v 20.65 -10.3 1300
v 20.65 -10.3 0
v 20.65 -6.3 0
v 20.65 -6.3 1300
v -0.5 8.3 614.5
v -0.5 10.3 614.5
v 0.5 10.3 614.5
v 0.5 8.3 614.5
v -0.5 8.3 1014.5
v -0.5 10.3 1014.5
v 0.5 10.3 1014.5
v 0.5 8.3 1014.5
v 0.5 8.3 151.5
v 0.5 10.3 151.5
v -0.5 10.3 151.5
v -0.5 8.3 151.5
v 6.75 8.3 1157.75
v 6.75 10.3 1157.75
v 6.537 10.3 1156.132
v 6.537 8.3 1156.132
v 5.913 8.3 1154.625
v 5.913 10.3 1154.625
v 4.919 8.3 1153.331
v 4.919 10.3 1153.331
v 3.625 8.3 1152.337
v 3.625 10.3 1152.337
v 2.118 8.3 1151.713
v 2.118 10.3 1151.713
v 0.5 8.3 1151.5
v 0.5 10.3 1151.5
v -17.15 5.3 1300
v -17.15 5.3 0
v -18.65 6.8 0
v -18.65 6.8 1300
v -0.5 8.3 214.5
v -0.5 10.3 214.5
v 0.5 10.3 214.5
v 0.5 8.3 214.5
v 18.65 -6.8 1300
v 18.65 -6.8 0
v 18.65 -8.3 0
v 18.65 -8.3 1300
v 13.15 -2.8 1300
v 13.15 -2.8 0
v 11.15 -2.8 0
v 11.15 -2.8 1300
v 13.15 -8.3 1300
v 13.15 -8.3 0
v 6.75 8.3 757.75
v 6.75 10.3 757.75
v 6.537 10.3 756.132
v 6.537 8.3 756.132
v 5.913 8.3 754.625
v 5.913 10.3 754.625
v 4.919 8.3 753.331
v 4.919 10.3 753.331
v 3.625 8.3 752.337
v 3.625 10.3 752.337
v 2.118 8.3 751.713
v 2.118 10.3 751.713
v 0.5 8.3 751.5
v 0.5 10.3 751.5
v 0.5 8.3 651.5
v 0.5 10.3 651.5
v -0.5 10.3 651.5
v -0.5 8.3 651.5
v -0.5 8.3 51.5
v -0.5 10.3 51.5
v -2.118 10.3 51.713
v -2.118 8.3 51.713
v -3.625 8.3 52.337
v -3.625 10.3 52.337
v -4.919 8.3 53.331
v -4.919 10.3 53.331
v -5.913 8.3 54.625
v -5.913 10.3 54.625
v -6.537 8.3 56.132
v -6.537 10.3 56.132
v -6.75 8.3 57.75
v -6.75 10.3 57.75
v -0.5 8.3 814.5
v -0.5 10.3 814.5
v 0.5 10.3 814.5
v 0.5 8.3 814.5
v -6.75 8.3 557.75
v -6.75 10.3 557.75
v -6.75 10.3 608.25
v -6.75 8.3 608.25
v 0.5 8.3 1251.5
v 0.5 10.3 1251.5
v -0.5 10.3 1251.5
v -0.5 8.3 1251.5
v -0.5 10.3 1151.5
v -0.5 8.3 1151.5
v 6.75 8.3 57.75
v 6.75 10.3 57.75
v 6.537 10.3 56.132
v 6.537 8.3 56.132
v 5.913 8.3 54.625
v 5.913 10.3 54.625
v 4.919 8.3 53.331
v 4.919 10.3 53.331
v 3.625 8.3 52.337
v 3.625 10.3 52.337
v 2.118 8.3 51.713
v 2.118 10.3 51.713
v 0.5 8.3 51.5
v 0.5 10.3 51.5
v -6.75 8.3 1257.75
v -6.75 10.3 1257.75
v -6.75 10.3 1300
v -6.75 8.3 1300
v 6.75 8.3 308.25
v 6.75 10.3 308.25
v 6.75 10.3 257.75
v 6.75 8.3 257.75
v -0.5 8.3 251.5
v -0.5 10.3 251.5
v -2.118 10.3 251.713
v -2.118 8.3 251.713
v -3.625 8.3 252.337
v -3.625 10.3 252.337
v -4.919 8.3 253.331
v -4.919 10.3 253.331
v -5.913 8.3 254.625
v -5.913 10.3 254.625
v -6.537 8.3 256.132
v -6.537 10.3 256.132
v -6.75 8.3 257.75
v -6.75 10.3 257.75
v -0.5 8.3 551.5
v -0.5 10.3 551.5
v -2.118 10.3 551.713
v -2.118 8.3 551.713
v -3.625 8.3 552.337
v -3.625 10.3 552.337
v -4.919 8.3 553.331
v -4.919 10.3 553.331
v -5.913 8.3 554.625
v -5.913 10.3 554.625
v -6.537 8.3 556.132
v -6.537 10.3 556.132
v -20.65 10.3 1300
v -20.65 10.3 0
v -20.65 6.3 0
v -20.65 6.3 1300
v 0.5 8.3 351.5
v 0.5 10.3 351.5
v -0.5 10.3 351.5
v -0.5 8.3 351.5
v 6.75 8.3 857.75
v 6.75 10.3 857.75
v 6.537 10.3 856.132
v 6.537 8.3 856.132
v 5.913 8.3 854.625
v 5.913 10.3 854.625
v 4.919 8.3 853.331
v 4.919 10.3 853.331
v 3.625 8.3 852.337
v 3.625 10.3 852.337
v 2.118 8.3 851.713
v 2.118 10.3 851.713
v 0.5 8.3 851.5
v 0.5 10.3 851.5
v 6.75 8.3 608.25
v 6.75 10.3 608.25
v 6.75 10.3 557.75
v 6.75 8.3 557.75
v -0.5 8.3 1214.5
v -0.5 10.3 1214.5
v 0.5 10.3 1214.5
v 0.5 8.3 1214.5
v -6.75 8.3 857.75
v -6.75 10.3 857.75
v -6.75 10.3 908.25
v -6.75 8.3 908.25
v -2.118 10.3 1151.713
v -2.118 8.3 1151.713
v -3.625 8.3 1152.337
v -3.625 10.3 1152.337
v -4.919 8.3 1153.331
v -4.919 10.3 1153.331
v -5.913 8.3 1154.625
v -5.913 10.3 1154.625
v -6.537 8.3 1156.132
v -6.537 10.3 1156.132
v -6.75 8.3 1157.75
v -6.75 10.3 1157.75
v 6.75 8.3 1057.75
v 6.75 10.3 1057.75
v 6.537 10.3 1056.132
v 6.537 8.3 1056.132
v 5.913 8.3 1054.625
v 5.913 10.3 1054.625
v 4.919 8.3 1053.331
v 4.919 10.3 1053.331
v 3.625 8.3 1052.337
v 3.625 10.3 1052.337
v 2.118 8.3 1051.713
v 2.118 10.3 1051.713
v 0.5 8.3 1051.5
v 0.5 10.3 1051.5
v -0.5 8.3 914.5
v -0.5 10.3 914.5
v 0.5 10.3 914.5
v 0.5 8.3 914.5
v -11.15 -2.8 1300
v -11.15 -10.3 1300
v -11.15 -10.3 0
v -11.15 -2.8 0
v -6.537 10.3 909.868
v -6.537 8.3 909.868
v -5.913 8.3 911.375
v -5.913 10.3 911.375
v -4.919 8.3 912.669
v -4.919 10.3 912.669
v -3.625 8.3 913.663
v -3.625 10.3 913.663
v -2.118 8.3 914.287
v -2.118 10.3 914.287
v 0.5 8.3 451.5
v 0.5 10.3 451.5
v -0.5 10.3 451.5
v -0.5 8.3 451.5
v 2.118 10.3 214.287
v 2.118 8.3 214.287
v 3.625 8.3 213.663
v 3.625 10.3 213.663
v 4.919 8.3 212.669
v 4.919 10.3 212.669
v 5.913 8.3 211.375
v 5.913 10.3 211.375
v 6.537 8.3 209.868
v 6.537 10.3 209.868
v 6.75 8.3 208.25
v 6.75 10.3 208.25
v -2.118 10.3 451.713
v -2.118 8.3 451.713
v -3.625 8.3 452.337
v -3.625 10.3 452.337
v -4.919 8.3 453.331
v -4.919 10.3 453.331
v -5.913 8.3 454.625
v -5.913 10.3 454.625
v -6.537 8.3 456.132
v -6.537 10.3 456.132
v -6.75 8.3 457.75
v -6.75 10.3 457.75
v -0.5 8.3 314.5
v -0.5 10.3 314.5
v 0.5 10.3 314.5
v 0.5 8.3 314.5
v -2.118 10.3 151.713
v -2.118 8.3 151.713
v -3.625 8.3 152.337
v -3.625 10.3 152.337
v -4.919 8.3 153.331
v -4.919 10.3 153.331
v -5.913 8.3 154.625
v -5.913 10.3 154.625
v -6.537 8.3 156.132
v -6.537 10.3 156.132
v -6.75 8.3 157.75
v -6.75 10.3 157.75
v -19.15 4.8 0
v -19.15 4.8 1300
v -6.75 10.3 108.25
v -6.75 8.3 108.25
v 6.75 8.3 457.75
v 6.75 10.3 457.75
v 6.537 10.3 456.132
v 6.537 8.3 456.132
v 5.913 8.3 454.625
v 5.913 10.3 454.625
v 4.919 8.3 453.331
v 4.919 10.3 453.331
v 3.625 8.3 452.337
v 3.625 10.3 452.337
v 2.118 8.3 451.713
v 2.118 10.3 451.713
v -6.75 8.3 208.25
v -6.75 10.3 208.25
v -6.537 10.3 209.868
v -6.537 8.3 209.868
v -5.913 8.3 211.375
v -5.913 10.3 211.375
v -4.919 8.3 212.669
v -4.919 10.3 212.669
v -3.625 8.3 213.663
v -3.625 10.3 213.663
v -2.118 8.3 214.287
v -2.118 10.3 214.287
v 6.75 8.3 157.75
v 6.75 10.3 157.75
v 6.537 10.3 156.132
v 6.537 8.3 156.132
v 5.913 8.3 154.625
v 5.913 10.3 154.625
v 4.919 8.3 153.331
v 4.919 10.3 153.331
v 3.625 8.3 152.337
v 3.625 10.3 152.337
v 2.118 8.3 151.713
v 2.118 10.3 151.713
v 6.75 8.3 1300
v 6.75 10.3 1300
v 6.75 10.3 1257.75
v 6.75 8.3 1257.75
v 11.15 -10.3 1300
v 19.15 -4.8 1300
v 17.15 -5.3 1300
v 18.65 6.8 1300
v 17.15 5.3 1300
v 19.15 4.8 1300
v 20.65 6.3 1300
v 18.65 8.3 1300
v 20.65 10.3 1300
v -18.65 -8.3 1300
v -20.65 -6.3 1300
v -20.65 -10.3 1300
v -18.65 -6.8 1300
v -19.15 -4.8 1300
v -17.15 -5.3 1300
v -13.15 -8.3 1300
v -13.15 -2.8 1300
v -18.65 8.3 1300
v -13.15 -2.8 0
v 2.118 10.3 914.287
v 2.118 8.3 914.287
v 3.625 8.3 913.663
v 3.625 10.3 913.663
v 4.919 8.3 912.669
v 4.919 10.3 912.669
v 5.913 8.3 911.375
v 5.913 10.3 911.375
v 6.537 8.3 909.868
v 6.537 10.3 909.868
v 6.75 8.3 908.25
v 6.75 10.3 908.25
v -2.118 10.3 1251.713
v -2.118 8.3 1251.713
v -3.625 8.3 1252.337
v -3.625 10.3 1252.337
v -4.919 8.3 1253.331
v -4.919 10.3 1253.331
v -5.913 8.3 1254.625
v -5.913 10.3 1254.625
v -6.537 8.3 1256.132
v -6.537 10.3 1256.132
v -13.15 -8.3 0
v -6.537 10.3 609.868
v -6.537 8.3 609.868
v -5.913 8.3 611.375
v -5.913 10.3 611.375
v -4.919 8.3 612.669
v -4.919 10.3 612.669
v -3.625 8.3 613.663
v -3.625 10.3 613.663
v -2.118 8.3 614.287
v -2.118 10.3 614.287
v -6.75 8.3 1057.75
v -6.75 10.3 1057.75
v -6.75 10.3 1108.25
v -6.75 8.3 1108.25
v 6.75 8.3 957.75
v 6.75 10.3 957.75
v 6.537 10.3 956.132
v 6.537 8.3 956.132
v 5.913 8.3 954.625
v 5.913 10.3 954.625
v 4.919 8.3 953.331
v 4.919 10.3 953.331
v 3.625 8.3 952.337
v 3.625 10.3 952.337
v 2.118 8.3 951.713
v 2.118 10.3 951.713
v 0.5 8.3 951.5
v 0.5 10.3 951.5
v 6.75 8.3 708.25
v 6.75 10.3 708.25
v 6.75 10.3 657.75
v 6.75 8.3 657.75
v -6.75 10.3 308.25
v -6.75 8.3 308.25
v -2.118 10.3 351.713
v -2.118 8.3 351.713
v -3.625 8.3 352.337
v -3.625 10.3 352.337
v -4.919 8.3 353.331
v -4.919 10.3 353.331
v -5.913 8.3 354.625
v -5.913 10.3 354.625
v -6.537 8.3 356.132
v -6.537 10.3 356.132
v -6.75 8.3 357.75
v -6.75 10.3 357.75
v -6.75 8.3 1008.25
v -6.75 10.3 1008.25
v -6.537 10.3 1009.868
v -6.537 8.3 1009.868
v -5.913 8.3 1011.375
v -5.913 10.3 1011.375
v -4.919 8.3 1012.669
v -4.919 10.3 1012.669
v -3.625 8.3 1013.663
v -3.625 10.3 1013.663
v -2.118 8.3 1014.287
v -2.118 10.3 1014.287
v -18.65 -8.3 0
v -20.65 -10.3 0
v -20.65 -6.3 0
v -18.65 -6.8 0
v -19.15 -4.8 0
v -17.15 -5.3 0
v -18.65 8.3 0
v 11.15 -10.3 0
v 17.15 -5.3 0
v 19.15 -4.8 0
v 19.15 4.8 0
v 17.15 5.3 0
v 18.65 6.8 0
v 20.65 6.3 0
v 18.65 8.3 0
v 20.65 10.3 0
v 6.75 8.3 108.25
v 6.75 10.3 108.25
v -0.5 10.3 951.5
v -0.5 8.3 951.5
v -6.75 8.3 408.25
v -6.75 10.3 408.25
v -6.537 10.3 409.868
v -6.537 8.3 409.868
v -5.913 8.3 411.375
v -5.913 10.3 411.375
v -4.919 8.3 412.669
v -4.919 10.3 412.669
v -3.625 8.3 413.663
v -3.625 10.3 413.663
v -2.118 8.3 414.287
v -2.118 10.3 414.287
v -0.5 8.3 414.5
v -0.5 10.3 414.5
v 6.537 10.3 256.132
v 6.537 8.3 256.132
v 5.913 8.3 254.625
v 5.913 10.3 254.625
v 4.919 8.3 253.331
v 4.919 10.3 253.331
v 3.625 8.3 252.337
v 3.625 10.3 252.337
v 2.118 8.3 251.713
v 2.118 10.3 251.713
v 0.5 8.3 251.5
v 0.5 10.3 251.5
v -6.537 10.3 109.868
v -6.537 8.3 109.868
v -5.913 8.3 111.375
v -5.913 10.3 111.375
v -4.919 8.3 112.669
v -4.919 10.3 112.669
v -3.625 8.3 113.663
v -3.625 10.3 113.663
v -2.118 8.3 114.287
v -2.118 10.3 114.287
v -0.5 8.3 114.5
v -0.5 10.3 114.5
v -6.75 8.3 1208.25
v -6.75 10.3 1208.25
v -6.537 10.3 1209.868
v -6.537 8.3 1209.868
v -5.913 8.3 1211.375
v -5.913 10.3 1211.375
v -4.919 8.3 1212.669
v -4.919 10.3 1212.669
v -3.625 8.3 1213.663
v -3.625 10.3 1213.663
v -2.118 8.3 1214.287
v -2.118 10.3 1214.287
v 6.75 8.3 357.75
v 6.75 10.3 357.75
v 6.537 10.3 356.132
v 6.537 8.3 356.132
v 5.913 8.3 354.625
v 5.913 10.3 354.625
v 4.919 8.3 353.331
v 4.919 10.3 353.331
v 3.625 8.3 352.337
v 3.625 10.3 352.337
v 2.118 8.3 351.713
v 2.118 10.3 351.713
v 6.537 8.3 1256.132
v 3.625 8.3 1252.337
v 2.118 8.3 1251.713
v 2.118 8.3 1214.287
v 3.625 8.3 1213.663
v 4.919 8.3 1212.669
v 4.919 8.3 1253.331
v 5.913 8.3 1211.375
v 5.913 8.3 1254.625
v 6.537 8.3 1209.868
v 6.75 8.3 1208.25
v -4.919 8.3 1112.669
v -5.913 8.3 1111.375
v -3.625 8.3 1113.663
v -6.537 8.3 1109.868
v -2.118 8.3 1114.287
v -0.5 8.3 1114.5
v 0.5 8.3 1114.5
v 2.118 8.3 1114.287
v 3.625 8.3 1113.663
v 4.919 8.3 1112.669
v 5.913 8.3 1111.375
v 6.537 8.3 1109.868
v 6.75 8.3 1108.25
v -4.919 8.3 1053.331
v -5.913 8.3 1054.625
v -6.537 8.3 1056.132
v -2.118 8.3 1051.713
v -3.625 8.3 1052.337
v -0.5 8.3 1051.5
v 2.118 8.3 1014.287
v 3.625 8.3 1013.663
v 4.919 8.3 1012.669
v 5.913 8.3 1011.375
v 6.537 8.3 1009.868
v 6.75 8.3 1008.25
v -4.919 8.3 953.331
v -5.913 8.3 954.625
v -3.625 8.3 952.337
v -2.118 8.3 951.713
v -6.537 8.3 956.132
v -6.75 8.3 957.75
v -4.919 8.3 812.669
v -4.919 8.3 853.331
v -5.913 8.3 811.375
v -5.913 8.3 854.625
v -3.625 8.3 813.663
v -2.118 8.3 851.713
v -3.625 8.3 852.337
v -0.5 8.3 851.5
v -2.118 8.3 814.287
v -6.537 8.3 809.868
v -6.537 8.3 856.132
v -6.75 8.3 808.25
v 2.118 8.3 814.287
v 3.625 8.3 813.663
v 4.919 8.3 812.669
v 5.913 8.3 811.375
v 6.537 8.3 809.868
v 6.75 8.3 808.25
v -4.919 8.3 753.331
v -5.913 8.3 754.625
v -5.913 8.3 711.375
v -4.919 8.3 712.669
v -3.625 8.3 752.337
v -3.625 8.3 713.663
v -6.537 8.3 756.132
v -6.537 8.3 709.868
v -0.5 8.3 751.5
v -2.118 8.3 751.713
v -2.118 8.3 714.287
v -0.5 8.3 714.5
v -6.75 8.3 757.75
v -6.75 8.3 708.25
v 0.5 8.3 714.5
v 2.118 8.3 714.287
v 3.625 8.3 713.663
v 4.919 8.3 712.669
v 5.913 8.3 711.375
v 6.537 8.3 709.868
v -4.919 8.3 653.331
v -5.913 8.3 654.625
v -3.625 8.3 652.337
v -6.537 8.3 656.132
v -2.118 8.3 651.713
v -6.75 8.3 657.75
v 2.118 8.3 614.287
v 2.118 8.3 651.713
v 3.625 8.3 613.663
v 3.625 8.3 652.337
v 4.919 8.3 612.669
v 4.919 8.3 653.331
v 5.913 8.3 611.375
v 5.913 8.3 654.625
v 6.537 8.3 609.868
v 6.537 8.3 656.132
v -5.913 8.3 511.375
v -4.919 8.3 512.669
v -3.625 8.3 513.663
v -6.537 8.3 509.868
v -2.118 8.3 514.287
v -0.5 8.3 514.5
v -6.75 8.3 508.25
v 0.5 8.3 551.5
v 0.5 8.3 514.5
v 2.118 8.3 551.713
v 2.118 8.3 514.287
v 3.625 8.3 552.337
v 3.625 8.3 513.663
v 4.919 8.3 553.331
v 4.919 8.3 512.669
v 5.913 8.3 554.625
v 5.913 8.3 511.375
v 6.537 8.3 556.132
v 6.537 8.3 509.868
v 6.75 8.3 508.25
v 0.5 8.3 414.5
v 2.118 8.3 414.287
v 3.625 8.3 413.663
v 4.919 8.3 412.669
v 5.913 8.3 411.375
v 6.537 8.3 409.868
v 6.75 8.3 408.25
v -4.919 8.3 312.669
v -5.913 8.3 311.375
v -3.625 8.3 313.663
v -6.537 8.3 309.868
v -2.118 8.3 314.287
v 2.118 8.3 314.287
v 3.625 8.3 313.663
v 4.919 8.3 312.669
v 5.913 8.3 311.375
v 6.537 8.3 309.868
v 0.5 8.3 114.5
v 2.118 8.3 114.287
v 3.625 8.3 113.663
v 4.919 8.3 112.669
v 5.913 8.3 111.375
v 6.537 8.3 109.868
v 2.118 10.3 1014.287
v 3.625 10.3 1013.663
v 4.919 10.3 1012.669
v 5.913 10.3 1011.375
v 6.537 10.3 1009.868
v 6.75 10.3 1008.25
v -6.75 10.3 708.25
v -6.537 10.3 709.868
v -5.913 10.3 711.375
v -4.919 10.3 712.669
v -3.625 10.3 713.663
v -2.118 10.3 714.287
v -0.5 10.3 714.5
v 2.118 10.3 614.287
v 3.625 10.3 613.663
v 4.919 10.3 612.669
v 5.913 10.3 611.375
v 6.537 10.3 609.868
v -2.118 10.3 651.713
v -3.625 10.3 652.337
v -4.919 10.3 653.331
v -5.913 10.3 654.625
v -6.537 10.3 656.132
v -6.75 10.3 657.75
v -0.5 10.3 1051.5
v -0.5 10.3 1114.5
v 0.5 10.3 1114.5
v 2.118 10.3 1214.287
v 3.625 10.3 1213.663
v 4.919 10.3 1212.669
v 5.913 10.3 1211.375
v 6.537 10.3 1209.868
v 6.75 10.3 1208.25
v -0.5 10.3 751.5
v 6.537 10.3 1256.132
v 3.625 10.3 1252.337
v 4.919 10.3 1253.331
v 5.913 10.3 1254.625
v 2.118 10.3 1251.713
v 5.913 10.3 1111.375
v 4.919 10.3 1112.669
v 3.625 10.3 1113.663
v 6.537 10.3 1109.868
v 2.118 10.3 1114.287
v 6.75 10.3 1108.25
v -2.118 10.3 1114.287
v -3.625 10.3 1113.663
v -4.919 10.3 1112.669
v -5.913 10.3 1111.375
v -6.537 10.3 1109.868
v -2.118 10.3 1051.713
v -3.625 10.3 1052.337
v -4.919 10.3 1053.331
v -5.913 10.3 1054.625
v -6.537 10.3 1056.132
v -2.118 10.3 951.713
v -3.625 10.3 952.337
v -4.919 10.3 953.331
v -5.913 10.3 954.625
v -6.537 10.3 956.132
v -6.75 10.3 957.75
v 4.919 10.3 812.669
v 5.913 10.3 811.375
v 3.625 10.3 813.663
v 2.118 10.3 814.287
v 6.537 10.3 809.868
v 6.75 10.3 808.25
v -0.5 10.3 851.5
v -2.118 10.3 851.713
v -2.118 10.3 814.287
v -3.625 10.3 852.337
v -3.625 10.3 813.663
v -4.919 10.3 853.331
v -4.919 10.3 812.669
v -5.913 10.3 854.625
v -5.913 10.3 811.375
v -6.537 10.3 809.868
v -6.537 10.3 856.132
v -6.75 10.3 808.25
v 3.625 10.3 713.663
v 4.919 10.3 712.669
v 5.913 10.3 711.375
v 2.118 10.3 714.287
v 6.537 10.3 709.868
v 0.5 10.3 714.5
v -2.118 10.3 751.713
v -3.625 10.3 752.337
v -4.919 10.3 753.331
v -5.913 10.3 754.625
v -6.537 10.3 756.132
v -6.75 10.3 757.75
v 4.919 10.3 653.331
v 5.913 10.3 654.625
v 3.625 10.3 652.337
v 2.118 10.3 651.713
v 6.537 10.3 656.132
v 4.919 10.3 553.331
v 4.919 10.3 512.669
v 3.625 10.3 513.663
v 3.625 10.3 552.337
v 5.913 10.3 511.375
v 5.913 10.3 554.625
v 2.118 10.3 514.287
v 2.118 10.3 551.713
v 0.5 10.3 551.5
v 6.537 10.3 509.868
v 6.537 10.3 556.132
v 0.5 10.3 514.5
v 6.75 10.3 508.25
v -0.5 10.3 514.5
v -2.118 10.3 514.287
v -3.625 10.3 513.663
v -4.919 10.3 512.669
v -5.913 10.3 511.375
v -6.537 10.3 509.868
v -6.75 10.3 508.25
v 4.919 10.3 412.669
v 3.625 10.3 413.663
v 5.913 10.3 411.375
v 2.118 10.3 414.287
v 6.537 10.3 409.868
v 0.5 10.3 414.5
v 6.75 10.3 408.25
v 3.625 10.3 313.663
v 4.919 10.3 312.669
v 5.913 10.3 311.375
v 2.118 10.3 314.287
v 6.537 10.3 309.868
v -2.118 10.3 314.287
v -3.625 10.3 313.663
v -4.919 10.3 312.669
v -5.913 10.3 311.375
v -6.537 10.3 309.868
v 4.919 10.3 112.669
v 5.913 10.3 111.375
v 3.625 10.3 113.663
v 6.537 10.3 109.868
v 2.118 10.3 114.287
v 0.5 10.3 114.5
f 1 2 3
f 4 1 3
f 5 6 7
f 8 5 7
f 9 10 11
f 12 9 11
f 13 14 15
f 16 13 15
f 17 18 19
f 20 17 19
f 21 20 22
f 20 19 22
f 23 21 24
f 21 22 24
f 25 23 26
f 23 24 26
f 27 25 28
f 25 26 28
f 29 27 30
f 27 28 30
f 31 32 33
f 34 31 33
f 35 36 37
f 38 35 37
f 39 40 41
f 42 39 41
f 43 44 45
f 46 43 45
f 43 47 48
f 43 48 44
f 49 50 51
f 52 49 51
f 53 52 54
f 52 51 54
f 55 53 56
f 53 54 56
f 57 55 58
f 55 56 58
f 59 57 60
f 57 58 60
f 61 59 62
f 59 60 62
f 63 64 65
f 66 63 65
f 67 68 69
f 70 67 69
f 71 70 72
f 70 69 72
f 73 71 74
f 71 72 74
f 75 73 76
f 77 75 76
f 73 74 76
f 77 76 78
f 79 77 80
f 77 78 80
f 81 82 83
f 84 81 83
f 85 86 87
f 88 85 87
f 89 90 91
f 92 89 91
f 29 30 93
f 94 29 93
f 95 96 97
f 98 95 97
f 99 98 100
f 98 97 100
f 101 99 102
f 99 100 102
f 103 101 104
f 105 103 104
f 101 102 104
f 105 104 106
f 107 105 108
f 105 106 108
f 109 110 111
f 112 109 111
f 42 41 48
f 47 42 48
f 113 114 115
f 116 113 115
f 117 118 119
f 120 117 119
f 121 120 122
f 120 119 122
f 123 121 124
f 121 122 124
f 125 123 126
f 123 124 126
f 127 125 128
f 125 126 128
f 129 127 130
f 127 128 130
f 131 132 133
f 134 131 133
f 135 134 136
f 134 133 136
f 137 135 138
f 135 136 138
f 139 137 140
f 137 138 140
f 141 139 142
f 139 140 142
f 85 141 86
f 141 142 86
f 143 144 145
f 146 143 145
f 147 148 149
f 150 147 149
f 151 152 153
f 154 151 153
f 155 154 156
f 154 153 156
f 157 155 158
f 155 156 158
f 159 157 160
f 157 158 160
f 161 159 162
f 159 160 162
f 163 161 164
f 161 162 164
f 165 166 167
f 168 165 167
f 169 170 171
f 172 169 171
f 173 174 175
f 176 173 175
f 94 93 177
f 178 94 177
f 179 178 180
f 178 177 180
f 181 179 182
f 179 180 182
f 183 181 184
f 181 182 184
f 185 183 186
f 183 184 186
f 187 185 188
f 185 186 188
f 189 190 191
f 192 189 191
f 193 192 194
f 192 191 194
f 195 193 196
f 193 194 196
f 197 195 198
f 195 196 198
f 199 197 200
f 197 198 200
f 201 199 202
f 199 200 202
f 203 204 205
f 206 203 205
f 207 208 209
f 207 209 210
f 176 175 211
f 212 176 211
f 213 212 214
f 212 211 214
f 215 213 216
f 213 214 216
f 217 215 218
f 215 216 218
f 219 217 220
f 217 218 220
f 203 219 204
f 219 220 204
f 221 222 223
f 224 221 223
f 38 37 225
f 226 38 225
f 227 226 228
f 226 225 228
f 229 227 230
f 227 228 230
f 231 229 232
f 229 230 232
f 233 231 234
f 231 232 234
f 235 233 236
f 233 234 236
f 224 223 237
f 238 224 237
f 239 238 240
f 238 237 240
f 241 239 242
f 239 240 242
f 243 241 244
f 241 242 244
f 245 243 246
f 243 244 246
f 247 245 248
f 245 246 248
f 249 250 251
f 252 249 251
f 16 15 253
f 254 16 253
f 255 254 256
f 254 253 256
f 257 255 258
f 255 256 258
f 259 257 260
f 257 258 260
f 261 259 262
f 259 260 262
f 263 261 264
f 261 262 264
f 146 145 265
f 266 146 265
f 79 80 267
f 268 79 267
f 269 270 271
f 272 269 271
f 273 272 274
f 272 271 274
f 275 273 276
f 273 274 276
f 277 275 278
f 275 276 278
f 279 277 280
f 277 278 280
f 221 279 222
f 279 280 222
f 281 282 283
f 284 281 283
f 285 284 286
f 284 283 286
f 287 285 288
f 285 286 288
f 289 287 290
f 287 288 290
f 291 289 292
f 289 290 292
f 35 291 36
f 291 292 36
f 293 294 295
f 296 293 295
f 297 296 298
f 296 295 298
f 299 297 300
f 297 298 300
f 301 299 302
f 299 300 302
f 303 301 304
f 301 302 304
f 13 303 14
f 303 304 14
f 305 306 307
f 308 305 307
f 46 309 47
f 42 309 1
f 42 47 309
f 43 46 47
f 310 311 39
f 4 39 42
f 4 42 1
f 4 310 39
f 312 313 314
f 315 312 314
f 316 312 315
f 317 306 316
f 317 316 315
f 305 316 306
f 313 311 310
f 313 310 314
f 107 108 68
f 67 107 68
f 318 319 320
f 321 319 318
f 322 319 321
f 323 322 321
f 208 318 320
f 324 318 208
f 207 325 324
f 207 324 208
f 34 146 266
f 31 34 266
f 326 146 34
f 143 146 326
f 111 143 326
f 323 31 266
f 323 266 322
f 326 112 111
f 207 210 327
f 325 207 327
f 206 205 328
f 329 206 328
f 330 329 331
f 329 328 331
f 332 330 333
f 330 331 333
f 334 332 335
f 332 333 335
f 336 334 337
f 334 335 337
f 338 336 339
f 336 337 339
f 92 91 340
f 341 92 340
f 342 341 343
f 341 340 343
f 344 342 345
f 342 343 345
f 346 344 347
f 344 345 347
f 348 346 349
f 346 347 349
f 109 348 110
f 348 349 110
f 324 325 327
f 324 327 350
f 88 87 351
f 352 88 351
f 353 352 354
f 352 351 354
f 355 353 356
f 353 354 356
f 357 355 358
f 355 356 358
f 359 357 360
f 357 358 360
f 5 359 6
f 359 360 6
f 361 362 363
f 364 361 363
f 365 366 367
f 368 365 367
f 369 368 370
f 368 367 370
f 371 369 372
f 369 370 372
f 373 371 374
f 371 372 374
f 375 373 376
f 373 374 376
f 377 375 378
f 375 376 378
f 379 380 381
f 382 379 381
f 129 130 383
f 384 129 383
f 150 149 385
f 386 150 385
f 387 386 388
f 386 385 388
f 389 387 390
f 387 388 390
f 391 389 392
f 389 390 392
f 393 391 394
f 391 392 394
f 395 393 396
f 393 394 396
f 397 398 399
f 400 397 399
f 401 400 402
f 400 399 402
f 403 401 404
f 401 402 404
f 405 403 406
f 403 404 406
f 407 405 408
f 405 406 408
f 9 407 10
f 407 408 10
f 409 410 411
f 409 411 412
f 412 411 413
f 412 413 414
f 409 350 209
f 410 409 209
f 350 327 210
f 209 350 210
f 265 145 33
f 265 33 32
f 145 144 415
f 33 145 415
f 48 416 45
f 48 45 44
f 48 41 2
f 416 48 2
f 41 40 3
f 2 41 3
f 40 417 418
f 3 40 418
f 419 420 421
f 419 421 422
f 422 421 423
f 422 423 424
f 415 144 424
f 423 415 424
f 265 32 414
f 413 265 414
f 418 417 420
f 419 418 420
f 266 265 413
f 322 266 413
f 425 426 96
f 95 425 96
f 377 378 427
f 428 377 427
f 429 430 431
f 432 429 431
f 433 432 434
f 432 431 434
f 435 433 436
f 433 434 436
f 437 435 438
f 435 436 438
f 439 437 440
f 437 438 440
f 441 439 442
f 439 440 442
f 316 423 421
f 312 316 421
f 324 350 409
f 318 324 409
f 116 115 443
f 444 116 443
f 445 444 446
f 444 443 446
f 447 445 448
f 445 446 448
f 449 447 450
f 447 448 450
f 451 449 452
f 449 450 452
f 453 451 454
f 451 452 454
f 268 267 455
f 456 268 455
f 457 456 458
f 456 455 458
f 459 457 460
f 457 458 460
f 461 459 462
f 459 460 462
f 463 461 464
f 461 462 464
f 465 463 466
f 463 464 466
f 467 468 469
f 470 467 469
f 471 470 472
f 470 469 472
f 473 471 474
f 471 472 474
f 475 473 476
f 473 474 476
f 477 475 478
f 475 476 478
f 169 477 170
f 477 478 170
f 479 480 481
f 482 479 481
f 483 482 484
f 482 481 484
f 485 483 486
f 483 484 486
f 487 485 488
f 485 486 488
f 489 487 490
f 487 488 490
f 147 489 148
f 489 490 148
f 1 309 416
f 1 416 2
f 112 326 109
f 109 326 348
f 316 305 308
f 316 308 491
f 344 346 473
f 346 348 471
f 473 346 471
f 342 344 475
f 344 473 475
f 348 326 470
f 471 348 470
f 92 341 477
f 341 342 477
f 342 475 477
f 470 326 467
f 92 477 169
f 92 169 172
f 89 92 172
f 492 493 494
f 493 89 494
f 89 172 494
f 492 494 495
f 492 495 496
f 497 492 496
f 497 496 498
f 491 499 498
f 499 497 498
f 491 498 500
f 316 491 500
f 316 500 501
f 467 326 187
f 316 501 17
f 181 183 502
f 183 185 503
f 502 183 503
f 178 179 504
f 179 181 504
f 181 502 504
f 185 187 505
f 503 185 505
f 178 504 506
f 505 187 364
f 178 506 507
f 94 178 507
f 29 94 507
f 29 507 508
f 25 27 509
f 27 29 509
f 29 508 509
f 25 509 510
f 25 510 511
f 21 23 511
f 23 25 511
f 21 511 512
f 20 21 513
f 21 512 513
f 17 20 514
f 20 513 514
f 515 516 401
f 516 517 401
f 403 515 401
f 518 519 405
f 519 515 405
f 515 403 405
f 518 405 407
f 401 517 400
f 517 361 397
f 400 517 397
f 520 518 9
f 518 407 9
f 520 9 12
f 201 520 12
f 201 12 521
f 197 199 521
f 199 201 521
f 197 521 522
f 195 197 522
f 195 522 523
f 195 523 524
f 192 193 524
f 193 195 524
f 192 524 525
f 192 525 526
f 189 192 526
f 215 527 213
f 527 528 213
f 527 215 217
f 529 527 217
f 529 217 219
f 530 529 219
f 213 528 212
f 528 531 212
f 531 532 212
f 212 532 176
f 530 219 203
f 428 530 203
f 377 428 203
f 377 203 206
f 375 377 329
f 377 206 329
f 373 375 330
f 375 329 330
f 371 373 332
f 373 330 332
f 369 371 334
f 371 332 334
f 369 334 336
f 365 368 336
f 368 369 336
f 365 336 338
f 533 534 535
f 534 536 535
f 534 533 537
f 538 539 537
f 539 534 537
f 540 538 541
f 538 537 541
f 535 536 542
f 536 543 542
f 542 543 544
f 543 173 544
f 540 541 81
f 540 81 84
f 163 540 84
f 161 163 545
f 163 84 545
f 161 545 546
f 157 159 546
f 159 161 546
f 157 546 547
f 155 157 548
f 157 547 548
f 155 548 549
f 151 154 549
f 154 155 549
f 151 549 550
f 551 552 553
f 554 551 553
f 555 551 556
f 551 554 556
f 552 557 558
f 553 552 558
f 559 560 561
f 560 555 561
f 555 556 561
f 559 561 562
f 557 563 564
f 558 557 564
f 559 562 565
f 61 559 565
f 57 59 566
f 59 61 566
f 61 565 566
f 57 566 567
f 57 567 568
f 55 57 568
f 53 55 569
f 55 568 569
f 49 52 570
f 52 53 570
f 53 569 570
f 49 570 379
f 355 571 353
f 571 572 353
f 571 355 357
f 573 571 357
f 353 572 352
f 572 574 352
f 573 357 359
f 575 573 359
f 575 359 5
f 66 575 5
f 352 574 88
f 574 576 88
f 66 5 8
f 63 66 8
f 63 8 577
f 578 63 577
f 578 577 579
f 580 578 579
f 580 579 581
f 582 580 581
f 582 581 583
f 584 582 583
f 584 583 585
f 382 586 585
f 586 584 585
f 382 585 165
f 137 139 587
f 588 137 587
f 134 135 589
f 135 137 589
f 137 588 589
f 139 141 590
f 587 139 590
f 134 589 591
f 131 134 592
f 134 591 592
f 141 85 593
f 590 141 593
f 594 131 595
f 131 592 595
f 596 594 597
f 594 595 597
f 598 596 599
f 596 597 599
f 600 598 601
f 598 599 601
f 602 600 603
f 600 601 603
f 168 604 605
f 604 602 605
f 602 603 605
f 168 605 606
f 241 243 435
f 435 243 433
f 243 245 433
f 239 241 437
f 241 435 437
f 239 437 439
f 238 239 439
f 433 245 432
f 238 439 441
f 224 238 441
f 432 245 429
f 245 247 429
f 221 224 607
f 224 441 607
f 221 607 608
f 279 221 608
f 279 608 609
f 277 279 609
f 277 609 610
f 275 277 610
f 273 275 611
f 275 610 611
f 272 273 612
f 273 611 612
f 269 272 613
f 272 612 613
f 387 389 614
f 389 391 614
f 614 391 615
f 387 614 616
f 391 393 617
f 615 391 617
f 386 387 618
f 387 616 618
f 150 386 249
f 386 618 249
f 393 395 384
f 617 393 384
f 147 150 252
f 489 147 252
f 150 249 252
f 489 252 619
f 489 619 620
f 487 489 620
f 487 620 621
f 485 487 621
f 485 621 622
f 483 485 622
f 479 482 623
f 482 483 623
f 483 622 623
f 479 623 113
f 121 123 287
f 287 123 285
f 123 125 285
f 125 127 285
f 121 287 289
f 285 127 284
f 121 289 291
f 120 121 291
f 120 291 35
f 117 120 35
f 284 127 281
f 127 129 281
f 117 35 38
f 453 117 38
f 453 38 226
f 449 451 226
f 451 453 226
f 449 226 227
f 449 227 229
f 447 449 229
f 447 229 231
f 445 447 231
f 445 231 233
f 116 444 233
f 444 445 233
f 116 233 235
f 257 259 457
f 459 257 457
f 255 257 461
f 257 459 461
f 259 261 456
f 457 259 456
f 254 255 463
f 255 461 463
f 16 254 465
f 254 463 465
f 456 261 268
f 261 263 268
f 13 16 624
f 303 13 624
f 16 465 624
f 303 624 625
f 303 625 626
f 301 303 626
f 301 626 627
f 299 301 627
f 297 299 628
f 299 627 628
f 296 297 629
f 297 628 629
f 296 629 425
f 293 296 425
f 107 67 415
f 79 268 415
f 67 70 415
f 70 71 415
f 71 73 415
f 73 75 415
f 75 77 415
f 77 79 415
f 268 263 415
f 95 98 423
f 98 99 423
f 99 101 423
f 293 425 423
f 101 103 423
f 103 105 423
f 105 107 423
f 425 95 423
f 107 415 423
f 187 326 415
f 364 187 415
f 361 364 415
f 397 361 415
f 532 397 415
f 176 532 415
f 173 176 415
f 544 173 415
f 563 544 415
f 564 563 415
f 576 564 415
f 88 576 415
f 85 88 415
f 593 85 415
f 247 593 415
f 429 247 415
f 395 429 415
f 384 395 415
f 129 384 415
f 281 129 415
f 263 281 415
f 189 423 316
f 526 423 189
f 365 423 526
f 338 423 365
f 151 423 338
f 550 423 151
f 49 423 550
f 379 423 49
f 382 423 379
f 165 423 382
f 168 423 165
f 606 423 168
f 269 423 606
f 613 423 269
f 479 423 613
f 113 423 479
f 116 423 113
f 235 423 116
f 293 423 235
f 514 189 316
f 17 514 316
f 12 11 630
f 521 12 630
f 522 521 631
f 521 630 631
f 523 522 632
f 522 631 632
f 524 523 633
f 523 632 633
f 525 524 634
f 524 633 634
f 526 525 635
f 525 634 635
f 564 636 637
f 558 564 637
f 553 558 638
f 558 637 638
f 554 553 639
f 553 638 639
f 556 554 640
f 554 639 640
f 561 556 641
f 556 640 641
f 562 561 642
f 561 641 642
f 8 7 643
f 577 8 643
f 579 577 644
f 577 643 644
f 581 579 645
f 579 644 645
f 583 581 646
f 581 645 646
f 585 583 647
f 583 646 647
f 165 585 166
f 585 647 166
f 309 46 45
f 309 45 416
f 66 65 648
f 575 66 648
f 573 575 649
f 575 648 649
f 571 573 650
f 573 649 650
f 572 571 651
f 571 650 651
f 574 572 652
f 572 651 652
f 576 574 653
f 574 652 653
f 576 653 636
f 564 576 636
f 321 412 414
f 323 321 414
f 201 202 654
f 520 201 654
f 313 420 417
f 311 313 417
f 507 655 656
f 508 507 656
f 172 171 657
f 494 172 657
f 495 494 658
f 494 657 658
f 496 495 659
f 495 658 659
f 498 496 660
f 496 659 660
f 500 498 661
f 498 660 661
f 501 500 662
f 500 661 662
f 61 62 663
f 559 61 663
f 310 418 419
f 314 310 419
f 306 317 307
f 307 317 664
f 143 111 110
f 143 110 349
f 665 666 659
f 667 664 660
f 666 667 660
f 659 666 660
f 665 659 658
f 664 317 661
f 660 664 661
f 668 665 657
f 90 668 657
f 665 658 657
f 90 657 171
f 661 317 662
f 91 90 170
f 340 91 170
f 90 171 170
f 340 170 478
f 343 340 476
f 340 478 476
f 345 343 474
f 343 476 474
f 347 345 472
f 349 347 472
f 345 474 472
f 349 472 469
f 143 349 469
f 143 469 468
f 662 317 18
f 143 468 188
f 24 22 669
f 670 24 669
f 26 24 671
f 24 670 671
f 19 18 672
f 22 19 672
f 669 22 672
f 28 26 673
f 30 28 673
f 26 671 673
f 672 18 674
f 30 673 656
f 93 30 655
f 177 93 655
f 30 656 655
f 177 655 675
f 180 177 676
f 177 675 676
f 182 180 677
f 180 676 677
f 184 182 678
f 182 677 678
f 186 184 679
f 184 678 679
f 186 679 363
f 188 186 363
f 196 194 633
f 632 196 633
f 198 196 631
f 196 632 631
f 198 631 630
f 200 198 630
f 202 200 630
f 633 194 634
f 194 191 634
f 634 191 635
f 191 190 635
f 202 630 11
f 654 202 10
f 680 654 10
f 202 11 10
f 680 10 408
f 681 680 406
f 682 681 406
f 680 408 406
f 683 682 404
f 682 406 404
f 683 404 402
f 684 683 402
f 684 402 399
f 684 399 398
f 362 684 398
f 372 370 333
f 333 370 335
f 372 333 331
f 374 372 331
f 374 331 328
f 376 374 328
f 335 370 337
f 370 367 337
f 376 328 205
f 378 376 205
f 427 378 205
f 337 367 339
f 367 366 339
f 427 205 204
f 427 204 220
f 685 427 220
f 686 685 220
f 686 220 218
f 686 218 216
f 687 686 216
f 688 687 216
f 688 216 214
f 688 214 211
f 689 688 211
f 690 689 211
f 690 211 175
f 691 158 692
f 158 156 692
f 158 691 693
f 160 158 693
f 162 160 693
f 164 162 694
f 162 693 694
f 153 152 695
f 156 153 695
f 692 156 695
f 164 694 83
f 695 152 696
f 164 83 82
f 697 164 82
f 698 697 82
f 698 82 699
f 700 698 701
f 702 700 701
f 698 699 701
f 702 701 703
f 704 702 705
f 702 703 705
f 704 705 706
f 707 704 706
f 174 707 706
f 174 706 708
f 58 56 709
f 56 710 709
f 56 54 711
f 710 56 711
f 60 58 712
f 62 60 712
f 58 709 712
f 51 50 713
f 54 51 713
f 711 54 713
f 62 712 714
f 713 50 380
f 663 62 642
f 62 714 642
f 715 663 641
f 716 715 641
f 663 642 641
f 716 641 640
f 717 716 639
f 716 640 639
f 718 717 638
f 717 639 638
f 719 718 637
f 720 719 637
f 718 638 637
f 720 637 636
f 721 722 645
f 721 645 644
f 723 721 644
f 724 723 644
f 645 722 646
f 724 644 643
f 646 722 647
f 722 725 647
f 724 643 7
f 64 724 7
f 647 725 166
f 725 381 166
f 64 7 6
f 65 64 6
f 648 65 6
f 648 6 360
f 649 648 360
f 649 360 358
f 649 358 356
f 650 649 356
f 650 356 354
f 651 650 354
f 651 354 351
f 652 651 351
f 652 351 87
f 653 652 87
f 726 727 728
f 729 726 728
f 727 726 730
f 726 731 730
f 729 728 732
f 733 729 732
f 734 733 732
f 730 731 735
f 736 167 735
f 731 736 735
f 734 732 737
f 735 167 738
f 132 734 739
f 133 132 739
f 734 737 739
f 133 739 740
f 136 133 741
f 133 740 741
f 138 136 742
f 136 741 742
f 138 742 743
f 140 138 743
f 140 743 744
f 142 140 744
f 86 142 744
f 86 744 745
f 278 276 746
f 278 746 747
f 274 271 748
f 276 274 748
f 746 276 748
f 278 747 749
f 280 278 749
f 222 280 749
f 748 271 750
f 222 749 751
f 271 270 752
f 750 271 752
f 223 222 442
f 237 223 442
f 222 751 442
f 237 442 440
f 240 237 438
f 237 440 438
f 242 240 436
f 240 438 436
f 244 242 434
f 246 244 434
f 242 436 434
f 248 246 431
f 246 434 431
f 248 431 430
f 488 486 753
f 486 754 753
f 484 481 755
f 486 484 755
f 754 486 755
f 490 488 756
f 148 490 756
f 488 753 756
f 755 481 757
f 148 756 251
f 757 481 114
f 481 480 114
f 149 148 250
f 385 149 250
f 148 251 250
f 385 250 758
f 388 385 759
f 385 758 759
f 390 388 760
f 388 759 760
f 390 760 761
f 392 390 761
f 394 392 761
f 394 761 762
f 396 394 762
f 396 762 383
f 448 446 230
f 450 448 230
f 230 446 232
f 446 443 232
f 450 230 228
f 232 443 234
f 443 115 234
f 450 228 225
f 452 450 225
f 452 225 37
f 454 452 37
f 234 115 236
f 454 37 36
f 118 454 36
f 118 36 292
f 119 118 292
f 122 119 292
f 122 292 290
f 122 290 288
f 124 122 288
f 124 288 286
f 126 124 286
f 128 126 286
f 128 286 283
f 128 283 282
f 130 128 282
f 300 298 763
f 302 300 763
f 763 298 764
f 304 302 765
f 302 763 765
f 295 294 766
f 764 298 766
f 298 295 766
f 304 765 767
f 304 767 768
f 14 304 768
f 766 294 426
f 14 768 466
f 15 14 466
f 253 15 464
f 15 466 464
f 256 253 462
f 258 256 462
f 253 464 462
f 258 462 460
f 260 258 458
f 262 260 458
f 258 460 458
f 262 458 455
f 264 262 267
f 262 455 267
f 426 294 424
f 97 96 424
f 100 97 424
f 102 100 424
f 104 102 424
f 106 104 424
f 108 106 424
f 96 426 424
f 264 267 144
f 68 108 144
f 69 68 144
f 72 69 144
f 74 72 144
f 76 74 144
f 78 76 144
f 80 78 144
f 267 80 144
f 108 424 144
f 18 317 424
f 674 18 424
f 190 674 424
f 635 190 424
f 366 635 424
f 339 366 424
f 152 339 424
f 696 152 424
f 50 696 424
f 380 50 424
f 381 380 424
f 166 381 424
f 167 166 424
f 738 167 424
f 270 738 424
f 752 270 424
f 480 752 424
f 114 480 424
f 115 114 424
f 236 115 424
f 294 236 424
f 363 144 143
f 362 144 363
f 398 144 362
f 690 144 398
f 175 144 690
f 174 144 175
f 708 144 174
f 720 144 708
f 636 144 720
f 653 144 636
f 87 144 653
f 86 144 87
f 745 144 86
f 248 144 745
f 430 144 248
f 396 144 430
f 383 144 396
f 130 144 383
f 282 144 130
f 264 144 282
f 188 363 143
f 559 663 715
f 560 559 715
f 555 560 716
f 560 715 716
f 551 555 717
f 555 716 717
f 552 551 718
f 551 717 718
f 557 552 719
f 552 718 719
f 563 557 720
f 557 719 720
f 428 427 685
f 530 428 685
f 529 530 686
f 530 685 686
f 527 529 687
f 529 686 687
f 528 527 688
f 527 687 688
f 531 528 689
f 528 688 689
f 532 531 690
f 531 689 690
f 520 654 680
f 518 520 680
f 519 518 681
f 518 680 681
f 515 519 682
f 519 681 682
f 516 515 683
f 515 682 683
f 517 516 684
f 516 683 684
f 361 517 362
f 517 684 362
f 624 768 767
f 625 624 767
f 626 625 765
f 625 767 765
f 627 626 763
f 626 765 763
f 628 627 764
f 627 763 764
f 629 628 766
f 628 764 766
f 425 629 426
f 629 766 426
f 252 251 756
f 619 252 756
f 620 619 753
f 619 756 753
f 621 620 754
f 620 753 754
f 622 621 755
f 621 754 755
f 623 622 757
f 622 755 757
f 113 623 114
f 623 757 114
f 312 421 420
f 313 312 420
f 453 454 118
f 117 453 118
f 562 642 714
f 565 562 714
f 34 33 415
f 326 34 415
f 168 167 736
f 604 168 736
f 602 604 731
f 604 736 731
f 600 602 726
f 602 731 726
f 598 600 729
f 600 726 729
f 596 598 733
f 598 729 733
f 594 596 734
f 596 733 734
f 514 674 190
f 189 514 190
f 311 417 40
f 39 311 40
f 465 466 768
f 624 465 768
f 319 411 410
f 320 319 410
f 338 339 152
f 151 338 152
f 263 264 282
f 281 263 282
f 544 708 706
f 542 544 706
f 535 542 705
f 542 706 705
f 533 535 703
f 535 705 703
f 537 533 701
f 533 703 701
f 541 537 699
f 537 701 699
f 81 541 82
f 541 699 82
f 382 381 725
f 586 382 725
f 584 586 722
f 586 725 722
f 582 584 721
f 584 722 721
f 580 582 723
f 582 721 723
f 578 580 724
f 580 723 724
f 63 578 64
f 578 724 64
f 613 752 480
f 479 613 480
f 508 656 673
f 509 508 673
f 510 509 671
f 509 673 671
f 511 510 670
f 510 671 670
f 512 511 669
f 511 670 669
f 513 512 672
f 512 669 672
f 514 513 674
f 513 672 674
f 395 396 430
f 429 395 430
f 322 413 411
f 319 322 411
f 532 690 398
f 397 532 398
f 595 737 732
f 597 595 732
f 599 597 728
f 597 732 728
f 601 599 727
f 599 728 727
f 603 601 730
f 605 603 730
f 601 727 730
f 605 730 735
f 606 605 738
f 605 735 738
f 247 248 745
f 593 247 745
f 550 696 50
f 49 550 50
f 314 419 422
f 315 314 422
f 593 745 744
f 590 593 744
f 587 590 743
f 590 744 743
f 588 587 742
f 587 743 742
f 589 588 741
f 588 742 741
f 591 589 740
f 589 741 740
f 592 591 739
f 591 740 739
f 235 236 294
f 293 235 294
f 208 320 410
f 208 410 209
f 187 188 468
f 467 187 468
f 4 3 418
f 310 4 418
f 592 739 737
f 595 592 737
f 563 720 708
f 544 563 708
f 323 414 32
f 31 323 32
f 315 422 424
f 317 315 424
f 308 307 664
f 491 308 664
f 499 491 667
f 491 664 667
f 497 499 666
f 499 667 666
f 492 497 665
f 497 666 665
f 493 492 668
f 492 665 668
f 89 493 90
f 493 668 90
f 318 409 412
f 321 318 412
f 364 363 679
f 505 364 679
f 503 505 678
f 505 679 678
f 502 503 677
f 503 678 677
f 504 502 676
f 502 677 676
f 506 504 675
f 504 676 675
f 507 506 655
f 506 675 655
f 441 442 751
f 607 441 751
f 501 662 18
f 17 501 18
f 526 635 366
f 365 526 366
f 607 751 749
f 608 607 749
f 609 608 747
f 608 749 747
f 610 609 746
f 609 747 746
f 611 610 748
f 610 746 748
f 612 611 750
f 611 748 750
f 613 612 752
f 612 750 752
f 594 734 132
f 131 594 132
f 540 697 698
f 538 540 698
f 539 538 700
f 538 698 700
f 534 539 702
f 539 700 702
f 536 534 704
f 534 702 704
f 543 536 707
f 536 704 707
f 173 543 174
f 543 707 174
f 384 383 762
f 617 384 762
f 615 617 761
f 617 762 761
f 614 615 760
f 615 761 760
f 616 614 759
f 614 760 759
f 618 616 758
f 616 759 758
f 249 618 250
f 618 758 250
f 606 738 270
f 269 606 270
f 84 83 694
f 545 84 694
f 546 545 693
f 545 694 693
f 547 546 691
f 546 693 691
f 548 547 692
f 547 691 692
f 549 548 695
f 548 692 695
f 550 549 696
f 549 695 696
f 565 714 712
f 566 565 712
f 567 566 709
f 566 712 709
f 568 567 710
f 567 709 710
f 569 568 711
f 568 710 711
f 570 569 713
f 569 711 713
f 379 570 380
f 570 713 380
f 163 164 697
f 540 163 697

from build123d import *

# Parameters (mm, degrees)
F1_DEPTH = 1300
F3_DEPTH = 25


with BuildPart() as f1:
    # F0 (on Top) → F1 (new body)
    with BuildSketch(Plane.XY):
        Polygon((20.65, 10.3), (0, 10.3), (-20.65, 10.3), (-20.65, 6.3), (-19.15, 4.8), (-19.15, -4.8), (-20.65, -6.3), (-20.65, -10.3), (-11.15, -10.3), (-11.15, -2.8), (-13.15, -2.8), (-13.15, -8.3), (-18.65, -8.3), (-18.65, -6.8), (-17.15, -5.3), (-17.15, 5.3), (-18.65, 6.8), (-18.65, 8.3), (0, 8.3), (18.65, 8.3), (18.65, 6.8), (17.15, 5.3), (17.15, -5.3), (18.65, -6.8), (18.65, -8.3), (13.15, -8.3), (13.15, -2.8), (11.15, -2.8), (11.15, -10.3), (20.65, -10.3), (20.65, -6.3), (19.15, -4.8), (19.15, 4.8), (20.65, 6.3), align=None)
    extrude(amount=F1_DEPTH)

    # F2 (on face) → F3 (cut)
    with BuildSketch(Plane(origin=(0, 10.3, 0), x_dir=(-1, 0, 0), z_dir=(0, 1, 0))):
        with BuildLine():
            Line((-0.5, 51.5), (0.5, 51.5))
            ThreePointArc((0.5, 51.5), (4.919417, 53.330583), (6.75, 57.75))
            Line((6.75, 57.75), (6.75, 108.25))
            ThreePointArc((6.75, 108.25), (4.919417, 112.669417), (0.5, 114.5))
            Line((0.5, 114.5), (-0.5, 114.5))
            ThreePointArc((-0.5, 114.5), (-4.919417, 112.669417), (-6.75, 108.25))
            Line((-6.75, 108.25), (-6.75, 57.75))
            ThreePointArc((-6.75, 57.75), (-4.919417, 53.330583), (-0.5, 51.5))
        make_face()
        with BuildLine():
            Line((-6.75, 208.25), (-6.75, 157.75))
            ThreePointArc((-6.75, 157.75), (-4.919417, 153.330583), (-0.5, 151.5))
            Line((-0.5, 151.5), (0.5, 151.5))
            ThreePointArc((0.5, 151.5), (4.919417, 153.330583), (6.75, 157.75))
            Line((6.75, 157.75), (6.75, 208.25))
            ThreePointArc((6.75, 208.25), (4.919417, 212.669417), (0.5, 214.5))
            Line((0.5, 214.5), (-0.5, 214.5))
            ThreePointArc((-0.5, 214.5), (-4.919417, 212.669417), (-6.75, 208.25))
        make_face()
        with BuildLine():
            Line((-6.75, 308.25), (-6.75, 257.75))
            ThreePointArc((-6.75, 257.75), (-4.919417, 253.330583), (-0.5, 251.5))
            Line((-0.5, 251.5), (0.5, 251.5))
            ThreePointArc((0.5, 251.5), (4.919417, 253.330583), (6.75, 257.75))
            Line((6.75, 257.75), (6.75, 308.25))
            ThreePointArc((6.75, 308.25), (4.919417, 312.669417), (0.5, 314.5))
            Line((0.5, 314.5), (-0.5, 314.5))
            ThreePointArc((-0.5, 314.5), (-4.919417, 312.669417), (-6.75, 308.25))
        make_face()
        with BuildLine():
            Line((-6.75, 408.25), (-6.75, 357.75))
            ThreePointArc((-6.75, 357.75), (-4.919417, 353.330583), (-0.5, 351.5))
            Line((-0.5, 351.5), (0.5, 351.5))
            ThreePointArc((0.5, 351.5), (4.919417, 353.330583), (6.75, 357.75))
            Line((6.75, 357.75), (6.75, 408.25))
            ThreePointArc((6.75, 408.25), (4.919417, 412.669417), (0.5, 414.5))
            Line((0.5, 414.5), (-0.5, 414.5))
            ThreePointArc((-0.5, 414.5), (-4.919417, 412.669417), (-6.75, 408.25))
        make_face()
        with BuildLine():
            Line((-6.75, 508.25), (-6.75, 457.75))
            ThreePointArc((-6.75, 457.75), (-4.919417, 453.330583), (-0.5, 451.5))
            Line((-0.5, 451.5), (0.5, 451.5))
            ThreePointArc((0.5, 451.5), (4.919417, 453.330583), (6.75, 457.75))
            Line((6.75, 457.75), (6.75, 508.25))
            ThreePointArc((6.75, 508.25), (4.919417, 512.669417), (0.5, 514.5))
            Line((0.5, 514.5), (-0.5, 514.5))
            ThreePointArc((-0.5, 514.5), (-4.919417, 512.669417), (-6.75, 508.25))
        make_face()
        with BuildLine():
            Line((-6.75, 608.25), (-6.75, 557.75))
            ThreePointArc((-6.75, 557.75), (-4.919417, 553.330583), (-0.5, 551.5))
            Line((-0.5, 551.5), (0.5, 551.5))
            ThreePointArc((0.5, 551.5), (4.919417, 553.330583), (6.75, 557.75))
            Line((6.75, 557.75), (6.75, 608.25))
            ThreePointArc((6.75, 608.25), (4.919417, 612.669417), (0.5, 614.5))
            Line((0.5, 614.5), (-0.5, 614.5))
            ThreePointArc((-0.5, 614.5), (-4.919417, 612.669417), (-6.75, 608.25))
        make_face()
        with BuildLine():
            Line((-6.75, 708.25), (-6.75, 657.75))
            ThreePointArc((-6.75, 657.75), (-4.919417, 653.330583), (-0.5, 651.5))
            Line((-0.5, 651.5), (0.5, 651.5))
            ThreePointArc((0.5, 651.5), (4.919417, 653.330583), (6.75, 657.75))
            Line((6.75, 657.75), (6.75, 708.25))
            ThreePointArc((6.75, 708.25), (4.919417, 712.669417), (0.5, 714.5))
            Line((0.5, 714.5), (-0.5, 714.5))
            ThreePointArc((-0.5, 714.5), (-4.919417, 712.669417), (-6.75, 708.25))
        make_face()
        with BuildLine():
            Line((-6.75, 808.25), (-6.75, 757.75))
            ThreePointArc((-6.75, 757.75), (-4.919417, 753.330583), (-0.5, 751.5))
            Line((-0.5, 751.5), (0.5, 751.5))
            ThreePointArc((0.5, 751.5), (4.919417, 753.330583), (6.75, 757.75))
            Line((6.75, 757.75), (6.75, 808.25))
            ThreePointArc((6.75, 808.25), (4.919417, 812.669417), (0.5, 814.5))
            Line((0.5, 814.5), (-0.5, 814.5))
            ThreePointArc((-0.5, 814.5), (-4.919417, 812.669417), (-6.75, 808.25))
        make_face()
        with BuildLine():
            Line((-6.75, 908.25), (-6.75, 857.75))
            ThreePointArc((-6.75, 857.75), (-4.919417, 853.330583), (-0.5, 851.5))
            Line((-0.5, 851.5), (0.5, 851.5))
            ThreePointArc((0.5, 851.5), (4.919417, 853.330583), (6.75, 857.75))
            Line((6.75, 857.75), (6.75, 908.25))
            ThreePointArc((6.75, 908.25), (4.919417, 912.669417), (0.5, 914.5))
            Line((0.5, 914.5), (-0.5, 914.5))
            ThreePointArc((-0.5, 914.5), (-4.919417, 912.669417), (-6.75, 908.25))
        make_face()
        with BuildLine():
            Line((-6.75, 1008.25), (-6.75, 957.75))
            ThreePointArc((-6.75, 957.75), (-4.919417, 953.330583), (-0.5, 951.5))
            Line((-0.5, 951.5), (0.5, 951.5))
            ThreePointArc((0.5, 951.5), (4.919417, 953.330583), (6.75, 957.75))
            Line((6.75, 957.75), (6.75, 1008.25))
            ThreePointArc((6.75, 1008.25), (4.919417, 1012.669417), (0.5, 1014.5))
            Line((0.5, 1014.5), (-0.5, 1014.5))
            ThreePointArc((-0.5, 1014.5), (-4.919417, 1012.669417), (-6.75, 1008.25))
        make_face()
        with BuildLine():
            Line((-6.75, 1108.25), (-6.75, 1057.75))
            ThreePointArc((-6.75, 1057.75), (-4.919417, 1053.330583), (-0.5, 1051.5))
            Line((-0.5, 1051.5), (0.5, 1051.5))
            ThreePointArc((0.5, 1051.5), (4.919417, 1053.330583), (6.75, 1057.75))
            Line((6.75, 1057.75), (6.75, 1108.25))
            ThreePointArc((6.75, 1108.25), (4.919417, 1112.669417), (0.5, 1114.5))
            Line((0.5, 1114.5), (-0.5, 1114.5))
            ThreePointArc((-0.5, 1114.5), (-4.919417, 1112.669417), (-6.75, 1108.25))
        make_face()
        with BuildLine():
            Line((-6.75, 1208.25), (-6.75, 1157.75))
            ThreePointArc((-6.75, 1157.75), (-4.919417, 1153.330583), (-0.5, 1151.5))
            Line((-0.5, 1151.5), (0.5, 1151.5))
            ThreePointArc((0.5, 1151.5), (4.919417, 1153.330583), (6.75, 1157.75))
            Line((6.75, 1157.75), (6.75, 1208.25))
            ThreePointArc((6.75, 1208.25), (4.919417, 1212.669417), (0.5, 1214.5))
            Line((0.5, 1214.5), (-0.5, 1214.5))
            ThreePointArc((-0.5, 1214.5), (-4.919417, 1212.669417), (-6.75, 1208.25))
        make_face()
        with BuildLine():
            Line((-6.75, 1300), (-6.75, 1257.75))
            ThreePointArc((-6.75, 1257.75), (-4.919417, 1253.330583), (-0.5, 1251.5))
            Line((-0.5, 1251.5), (0.5, 1251.5))
            ThreePointArc((0.5, 1251.5), (4.919417, 1253.330583), (6.75, 1257.75))
            Line((6.75, 1257.75), (6.75, 1300))
            Line((6.75, 1300), (-6.75, 1300))
        make_face()
    extrude(amount=-F3_DEPTH, mode=Mode.SUBTRACT)


solid = f1.part
